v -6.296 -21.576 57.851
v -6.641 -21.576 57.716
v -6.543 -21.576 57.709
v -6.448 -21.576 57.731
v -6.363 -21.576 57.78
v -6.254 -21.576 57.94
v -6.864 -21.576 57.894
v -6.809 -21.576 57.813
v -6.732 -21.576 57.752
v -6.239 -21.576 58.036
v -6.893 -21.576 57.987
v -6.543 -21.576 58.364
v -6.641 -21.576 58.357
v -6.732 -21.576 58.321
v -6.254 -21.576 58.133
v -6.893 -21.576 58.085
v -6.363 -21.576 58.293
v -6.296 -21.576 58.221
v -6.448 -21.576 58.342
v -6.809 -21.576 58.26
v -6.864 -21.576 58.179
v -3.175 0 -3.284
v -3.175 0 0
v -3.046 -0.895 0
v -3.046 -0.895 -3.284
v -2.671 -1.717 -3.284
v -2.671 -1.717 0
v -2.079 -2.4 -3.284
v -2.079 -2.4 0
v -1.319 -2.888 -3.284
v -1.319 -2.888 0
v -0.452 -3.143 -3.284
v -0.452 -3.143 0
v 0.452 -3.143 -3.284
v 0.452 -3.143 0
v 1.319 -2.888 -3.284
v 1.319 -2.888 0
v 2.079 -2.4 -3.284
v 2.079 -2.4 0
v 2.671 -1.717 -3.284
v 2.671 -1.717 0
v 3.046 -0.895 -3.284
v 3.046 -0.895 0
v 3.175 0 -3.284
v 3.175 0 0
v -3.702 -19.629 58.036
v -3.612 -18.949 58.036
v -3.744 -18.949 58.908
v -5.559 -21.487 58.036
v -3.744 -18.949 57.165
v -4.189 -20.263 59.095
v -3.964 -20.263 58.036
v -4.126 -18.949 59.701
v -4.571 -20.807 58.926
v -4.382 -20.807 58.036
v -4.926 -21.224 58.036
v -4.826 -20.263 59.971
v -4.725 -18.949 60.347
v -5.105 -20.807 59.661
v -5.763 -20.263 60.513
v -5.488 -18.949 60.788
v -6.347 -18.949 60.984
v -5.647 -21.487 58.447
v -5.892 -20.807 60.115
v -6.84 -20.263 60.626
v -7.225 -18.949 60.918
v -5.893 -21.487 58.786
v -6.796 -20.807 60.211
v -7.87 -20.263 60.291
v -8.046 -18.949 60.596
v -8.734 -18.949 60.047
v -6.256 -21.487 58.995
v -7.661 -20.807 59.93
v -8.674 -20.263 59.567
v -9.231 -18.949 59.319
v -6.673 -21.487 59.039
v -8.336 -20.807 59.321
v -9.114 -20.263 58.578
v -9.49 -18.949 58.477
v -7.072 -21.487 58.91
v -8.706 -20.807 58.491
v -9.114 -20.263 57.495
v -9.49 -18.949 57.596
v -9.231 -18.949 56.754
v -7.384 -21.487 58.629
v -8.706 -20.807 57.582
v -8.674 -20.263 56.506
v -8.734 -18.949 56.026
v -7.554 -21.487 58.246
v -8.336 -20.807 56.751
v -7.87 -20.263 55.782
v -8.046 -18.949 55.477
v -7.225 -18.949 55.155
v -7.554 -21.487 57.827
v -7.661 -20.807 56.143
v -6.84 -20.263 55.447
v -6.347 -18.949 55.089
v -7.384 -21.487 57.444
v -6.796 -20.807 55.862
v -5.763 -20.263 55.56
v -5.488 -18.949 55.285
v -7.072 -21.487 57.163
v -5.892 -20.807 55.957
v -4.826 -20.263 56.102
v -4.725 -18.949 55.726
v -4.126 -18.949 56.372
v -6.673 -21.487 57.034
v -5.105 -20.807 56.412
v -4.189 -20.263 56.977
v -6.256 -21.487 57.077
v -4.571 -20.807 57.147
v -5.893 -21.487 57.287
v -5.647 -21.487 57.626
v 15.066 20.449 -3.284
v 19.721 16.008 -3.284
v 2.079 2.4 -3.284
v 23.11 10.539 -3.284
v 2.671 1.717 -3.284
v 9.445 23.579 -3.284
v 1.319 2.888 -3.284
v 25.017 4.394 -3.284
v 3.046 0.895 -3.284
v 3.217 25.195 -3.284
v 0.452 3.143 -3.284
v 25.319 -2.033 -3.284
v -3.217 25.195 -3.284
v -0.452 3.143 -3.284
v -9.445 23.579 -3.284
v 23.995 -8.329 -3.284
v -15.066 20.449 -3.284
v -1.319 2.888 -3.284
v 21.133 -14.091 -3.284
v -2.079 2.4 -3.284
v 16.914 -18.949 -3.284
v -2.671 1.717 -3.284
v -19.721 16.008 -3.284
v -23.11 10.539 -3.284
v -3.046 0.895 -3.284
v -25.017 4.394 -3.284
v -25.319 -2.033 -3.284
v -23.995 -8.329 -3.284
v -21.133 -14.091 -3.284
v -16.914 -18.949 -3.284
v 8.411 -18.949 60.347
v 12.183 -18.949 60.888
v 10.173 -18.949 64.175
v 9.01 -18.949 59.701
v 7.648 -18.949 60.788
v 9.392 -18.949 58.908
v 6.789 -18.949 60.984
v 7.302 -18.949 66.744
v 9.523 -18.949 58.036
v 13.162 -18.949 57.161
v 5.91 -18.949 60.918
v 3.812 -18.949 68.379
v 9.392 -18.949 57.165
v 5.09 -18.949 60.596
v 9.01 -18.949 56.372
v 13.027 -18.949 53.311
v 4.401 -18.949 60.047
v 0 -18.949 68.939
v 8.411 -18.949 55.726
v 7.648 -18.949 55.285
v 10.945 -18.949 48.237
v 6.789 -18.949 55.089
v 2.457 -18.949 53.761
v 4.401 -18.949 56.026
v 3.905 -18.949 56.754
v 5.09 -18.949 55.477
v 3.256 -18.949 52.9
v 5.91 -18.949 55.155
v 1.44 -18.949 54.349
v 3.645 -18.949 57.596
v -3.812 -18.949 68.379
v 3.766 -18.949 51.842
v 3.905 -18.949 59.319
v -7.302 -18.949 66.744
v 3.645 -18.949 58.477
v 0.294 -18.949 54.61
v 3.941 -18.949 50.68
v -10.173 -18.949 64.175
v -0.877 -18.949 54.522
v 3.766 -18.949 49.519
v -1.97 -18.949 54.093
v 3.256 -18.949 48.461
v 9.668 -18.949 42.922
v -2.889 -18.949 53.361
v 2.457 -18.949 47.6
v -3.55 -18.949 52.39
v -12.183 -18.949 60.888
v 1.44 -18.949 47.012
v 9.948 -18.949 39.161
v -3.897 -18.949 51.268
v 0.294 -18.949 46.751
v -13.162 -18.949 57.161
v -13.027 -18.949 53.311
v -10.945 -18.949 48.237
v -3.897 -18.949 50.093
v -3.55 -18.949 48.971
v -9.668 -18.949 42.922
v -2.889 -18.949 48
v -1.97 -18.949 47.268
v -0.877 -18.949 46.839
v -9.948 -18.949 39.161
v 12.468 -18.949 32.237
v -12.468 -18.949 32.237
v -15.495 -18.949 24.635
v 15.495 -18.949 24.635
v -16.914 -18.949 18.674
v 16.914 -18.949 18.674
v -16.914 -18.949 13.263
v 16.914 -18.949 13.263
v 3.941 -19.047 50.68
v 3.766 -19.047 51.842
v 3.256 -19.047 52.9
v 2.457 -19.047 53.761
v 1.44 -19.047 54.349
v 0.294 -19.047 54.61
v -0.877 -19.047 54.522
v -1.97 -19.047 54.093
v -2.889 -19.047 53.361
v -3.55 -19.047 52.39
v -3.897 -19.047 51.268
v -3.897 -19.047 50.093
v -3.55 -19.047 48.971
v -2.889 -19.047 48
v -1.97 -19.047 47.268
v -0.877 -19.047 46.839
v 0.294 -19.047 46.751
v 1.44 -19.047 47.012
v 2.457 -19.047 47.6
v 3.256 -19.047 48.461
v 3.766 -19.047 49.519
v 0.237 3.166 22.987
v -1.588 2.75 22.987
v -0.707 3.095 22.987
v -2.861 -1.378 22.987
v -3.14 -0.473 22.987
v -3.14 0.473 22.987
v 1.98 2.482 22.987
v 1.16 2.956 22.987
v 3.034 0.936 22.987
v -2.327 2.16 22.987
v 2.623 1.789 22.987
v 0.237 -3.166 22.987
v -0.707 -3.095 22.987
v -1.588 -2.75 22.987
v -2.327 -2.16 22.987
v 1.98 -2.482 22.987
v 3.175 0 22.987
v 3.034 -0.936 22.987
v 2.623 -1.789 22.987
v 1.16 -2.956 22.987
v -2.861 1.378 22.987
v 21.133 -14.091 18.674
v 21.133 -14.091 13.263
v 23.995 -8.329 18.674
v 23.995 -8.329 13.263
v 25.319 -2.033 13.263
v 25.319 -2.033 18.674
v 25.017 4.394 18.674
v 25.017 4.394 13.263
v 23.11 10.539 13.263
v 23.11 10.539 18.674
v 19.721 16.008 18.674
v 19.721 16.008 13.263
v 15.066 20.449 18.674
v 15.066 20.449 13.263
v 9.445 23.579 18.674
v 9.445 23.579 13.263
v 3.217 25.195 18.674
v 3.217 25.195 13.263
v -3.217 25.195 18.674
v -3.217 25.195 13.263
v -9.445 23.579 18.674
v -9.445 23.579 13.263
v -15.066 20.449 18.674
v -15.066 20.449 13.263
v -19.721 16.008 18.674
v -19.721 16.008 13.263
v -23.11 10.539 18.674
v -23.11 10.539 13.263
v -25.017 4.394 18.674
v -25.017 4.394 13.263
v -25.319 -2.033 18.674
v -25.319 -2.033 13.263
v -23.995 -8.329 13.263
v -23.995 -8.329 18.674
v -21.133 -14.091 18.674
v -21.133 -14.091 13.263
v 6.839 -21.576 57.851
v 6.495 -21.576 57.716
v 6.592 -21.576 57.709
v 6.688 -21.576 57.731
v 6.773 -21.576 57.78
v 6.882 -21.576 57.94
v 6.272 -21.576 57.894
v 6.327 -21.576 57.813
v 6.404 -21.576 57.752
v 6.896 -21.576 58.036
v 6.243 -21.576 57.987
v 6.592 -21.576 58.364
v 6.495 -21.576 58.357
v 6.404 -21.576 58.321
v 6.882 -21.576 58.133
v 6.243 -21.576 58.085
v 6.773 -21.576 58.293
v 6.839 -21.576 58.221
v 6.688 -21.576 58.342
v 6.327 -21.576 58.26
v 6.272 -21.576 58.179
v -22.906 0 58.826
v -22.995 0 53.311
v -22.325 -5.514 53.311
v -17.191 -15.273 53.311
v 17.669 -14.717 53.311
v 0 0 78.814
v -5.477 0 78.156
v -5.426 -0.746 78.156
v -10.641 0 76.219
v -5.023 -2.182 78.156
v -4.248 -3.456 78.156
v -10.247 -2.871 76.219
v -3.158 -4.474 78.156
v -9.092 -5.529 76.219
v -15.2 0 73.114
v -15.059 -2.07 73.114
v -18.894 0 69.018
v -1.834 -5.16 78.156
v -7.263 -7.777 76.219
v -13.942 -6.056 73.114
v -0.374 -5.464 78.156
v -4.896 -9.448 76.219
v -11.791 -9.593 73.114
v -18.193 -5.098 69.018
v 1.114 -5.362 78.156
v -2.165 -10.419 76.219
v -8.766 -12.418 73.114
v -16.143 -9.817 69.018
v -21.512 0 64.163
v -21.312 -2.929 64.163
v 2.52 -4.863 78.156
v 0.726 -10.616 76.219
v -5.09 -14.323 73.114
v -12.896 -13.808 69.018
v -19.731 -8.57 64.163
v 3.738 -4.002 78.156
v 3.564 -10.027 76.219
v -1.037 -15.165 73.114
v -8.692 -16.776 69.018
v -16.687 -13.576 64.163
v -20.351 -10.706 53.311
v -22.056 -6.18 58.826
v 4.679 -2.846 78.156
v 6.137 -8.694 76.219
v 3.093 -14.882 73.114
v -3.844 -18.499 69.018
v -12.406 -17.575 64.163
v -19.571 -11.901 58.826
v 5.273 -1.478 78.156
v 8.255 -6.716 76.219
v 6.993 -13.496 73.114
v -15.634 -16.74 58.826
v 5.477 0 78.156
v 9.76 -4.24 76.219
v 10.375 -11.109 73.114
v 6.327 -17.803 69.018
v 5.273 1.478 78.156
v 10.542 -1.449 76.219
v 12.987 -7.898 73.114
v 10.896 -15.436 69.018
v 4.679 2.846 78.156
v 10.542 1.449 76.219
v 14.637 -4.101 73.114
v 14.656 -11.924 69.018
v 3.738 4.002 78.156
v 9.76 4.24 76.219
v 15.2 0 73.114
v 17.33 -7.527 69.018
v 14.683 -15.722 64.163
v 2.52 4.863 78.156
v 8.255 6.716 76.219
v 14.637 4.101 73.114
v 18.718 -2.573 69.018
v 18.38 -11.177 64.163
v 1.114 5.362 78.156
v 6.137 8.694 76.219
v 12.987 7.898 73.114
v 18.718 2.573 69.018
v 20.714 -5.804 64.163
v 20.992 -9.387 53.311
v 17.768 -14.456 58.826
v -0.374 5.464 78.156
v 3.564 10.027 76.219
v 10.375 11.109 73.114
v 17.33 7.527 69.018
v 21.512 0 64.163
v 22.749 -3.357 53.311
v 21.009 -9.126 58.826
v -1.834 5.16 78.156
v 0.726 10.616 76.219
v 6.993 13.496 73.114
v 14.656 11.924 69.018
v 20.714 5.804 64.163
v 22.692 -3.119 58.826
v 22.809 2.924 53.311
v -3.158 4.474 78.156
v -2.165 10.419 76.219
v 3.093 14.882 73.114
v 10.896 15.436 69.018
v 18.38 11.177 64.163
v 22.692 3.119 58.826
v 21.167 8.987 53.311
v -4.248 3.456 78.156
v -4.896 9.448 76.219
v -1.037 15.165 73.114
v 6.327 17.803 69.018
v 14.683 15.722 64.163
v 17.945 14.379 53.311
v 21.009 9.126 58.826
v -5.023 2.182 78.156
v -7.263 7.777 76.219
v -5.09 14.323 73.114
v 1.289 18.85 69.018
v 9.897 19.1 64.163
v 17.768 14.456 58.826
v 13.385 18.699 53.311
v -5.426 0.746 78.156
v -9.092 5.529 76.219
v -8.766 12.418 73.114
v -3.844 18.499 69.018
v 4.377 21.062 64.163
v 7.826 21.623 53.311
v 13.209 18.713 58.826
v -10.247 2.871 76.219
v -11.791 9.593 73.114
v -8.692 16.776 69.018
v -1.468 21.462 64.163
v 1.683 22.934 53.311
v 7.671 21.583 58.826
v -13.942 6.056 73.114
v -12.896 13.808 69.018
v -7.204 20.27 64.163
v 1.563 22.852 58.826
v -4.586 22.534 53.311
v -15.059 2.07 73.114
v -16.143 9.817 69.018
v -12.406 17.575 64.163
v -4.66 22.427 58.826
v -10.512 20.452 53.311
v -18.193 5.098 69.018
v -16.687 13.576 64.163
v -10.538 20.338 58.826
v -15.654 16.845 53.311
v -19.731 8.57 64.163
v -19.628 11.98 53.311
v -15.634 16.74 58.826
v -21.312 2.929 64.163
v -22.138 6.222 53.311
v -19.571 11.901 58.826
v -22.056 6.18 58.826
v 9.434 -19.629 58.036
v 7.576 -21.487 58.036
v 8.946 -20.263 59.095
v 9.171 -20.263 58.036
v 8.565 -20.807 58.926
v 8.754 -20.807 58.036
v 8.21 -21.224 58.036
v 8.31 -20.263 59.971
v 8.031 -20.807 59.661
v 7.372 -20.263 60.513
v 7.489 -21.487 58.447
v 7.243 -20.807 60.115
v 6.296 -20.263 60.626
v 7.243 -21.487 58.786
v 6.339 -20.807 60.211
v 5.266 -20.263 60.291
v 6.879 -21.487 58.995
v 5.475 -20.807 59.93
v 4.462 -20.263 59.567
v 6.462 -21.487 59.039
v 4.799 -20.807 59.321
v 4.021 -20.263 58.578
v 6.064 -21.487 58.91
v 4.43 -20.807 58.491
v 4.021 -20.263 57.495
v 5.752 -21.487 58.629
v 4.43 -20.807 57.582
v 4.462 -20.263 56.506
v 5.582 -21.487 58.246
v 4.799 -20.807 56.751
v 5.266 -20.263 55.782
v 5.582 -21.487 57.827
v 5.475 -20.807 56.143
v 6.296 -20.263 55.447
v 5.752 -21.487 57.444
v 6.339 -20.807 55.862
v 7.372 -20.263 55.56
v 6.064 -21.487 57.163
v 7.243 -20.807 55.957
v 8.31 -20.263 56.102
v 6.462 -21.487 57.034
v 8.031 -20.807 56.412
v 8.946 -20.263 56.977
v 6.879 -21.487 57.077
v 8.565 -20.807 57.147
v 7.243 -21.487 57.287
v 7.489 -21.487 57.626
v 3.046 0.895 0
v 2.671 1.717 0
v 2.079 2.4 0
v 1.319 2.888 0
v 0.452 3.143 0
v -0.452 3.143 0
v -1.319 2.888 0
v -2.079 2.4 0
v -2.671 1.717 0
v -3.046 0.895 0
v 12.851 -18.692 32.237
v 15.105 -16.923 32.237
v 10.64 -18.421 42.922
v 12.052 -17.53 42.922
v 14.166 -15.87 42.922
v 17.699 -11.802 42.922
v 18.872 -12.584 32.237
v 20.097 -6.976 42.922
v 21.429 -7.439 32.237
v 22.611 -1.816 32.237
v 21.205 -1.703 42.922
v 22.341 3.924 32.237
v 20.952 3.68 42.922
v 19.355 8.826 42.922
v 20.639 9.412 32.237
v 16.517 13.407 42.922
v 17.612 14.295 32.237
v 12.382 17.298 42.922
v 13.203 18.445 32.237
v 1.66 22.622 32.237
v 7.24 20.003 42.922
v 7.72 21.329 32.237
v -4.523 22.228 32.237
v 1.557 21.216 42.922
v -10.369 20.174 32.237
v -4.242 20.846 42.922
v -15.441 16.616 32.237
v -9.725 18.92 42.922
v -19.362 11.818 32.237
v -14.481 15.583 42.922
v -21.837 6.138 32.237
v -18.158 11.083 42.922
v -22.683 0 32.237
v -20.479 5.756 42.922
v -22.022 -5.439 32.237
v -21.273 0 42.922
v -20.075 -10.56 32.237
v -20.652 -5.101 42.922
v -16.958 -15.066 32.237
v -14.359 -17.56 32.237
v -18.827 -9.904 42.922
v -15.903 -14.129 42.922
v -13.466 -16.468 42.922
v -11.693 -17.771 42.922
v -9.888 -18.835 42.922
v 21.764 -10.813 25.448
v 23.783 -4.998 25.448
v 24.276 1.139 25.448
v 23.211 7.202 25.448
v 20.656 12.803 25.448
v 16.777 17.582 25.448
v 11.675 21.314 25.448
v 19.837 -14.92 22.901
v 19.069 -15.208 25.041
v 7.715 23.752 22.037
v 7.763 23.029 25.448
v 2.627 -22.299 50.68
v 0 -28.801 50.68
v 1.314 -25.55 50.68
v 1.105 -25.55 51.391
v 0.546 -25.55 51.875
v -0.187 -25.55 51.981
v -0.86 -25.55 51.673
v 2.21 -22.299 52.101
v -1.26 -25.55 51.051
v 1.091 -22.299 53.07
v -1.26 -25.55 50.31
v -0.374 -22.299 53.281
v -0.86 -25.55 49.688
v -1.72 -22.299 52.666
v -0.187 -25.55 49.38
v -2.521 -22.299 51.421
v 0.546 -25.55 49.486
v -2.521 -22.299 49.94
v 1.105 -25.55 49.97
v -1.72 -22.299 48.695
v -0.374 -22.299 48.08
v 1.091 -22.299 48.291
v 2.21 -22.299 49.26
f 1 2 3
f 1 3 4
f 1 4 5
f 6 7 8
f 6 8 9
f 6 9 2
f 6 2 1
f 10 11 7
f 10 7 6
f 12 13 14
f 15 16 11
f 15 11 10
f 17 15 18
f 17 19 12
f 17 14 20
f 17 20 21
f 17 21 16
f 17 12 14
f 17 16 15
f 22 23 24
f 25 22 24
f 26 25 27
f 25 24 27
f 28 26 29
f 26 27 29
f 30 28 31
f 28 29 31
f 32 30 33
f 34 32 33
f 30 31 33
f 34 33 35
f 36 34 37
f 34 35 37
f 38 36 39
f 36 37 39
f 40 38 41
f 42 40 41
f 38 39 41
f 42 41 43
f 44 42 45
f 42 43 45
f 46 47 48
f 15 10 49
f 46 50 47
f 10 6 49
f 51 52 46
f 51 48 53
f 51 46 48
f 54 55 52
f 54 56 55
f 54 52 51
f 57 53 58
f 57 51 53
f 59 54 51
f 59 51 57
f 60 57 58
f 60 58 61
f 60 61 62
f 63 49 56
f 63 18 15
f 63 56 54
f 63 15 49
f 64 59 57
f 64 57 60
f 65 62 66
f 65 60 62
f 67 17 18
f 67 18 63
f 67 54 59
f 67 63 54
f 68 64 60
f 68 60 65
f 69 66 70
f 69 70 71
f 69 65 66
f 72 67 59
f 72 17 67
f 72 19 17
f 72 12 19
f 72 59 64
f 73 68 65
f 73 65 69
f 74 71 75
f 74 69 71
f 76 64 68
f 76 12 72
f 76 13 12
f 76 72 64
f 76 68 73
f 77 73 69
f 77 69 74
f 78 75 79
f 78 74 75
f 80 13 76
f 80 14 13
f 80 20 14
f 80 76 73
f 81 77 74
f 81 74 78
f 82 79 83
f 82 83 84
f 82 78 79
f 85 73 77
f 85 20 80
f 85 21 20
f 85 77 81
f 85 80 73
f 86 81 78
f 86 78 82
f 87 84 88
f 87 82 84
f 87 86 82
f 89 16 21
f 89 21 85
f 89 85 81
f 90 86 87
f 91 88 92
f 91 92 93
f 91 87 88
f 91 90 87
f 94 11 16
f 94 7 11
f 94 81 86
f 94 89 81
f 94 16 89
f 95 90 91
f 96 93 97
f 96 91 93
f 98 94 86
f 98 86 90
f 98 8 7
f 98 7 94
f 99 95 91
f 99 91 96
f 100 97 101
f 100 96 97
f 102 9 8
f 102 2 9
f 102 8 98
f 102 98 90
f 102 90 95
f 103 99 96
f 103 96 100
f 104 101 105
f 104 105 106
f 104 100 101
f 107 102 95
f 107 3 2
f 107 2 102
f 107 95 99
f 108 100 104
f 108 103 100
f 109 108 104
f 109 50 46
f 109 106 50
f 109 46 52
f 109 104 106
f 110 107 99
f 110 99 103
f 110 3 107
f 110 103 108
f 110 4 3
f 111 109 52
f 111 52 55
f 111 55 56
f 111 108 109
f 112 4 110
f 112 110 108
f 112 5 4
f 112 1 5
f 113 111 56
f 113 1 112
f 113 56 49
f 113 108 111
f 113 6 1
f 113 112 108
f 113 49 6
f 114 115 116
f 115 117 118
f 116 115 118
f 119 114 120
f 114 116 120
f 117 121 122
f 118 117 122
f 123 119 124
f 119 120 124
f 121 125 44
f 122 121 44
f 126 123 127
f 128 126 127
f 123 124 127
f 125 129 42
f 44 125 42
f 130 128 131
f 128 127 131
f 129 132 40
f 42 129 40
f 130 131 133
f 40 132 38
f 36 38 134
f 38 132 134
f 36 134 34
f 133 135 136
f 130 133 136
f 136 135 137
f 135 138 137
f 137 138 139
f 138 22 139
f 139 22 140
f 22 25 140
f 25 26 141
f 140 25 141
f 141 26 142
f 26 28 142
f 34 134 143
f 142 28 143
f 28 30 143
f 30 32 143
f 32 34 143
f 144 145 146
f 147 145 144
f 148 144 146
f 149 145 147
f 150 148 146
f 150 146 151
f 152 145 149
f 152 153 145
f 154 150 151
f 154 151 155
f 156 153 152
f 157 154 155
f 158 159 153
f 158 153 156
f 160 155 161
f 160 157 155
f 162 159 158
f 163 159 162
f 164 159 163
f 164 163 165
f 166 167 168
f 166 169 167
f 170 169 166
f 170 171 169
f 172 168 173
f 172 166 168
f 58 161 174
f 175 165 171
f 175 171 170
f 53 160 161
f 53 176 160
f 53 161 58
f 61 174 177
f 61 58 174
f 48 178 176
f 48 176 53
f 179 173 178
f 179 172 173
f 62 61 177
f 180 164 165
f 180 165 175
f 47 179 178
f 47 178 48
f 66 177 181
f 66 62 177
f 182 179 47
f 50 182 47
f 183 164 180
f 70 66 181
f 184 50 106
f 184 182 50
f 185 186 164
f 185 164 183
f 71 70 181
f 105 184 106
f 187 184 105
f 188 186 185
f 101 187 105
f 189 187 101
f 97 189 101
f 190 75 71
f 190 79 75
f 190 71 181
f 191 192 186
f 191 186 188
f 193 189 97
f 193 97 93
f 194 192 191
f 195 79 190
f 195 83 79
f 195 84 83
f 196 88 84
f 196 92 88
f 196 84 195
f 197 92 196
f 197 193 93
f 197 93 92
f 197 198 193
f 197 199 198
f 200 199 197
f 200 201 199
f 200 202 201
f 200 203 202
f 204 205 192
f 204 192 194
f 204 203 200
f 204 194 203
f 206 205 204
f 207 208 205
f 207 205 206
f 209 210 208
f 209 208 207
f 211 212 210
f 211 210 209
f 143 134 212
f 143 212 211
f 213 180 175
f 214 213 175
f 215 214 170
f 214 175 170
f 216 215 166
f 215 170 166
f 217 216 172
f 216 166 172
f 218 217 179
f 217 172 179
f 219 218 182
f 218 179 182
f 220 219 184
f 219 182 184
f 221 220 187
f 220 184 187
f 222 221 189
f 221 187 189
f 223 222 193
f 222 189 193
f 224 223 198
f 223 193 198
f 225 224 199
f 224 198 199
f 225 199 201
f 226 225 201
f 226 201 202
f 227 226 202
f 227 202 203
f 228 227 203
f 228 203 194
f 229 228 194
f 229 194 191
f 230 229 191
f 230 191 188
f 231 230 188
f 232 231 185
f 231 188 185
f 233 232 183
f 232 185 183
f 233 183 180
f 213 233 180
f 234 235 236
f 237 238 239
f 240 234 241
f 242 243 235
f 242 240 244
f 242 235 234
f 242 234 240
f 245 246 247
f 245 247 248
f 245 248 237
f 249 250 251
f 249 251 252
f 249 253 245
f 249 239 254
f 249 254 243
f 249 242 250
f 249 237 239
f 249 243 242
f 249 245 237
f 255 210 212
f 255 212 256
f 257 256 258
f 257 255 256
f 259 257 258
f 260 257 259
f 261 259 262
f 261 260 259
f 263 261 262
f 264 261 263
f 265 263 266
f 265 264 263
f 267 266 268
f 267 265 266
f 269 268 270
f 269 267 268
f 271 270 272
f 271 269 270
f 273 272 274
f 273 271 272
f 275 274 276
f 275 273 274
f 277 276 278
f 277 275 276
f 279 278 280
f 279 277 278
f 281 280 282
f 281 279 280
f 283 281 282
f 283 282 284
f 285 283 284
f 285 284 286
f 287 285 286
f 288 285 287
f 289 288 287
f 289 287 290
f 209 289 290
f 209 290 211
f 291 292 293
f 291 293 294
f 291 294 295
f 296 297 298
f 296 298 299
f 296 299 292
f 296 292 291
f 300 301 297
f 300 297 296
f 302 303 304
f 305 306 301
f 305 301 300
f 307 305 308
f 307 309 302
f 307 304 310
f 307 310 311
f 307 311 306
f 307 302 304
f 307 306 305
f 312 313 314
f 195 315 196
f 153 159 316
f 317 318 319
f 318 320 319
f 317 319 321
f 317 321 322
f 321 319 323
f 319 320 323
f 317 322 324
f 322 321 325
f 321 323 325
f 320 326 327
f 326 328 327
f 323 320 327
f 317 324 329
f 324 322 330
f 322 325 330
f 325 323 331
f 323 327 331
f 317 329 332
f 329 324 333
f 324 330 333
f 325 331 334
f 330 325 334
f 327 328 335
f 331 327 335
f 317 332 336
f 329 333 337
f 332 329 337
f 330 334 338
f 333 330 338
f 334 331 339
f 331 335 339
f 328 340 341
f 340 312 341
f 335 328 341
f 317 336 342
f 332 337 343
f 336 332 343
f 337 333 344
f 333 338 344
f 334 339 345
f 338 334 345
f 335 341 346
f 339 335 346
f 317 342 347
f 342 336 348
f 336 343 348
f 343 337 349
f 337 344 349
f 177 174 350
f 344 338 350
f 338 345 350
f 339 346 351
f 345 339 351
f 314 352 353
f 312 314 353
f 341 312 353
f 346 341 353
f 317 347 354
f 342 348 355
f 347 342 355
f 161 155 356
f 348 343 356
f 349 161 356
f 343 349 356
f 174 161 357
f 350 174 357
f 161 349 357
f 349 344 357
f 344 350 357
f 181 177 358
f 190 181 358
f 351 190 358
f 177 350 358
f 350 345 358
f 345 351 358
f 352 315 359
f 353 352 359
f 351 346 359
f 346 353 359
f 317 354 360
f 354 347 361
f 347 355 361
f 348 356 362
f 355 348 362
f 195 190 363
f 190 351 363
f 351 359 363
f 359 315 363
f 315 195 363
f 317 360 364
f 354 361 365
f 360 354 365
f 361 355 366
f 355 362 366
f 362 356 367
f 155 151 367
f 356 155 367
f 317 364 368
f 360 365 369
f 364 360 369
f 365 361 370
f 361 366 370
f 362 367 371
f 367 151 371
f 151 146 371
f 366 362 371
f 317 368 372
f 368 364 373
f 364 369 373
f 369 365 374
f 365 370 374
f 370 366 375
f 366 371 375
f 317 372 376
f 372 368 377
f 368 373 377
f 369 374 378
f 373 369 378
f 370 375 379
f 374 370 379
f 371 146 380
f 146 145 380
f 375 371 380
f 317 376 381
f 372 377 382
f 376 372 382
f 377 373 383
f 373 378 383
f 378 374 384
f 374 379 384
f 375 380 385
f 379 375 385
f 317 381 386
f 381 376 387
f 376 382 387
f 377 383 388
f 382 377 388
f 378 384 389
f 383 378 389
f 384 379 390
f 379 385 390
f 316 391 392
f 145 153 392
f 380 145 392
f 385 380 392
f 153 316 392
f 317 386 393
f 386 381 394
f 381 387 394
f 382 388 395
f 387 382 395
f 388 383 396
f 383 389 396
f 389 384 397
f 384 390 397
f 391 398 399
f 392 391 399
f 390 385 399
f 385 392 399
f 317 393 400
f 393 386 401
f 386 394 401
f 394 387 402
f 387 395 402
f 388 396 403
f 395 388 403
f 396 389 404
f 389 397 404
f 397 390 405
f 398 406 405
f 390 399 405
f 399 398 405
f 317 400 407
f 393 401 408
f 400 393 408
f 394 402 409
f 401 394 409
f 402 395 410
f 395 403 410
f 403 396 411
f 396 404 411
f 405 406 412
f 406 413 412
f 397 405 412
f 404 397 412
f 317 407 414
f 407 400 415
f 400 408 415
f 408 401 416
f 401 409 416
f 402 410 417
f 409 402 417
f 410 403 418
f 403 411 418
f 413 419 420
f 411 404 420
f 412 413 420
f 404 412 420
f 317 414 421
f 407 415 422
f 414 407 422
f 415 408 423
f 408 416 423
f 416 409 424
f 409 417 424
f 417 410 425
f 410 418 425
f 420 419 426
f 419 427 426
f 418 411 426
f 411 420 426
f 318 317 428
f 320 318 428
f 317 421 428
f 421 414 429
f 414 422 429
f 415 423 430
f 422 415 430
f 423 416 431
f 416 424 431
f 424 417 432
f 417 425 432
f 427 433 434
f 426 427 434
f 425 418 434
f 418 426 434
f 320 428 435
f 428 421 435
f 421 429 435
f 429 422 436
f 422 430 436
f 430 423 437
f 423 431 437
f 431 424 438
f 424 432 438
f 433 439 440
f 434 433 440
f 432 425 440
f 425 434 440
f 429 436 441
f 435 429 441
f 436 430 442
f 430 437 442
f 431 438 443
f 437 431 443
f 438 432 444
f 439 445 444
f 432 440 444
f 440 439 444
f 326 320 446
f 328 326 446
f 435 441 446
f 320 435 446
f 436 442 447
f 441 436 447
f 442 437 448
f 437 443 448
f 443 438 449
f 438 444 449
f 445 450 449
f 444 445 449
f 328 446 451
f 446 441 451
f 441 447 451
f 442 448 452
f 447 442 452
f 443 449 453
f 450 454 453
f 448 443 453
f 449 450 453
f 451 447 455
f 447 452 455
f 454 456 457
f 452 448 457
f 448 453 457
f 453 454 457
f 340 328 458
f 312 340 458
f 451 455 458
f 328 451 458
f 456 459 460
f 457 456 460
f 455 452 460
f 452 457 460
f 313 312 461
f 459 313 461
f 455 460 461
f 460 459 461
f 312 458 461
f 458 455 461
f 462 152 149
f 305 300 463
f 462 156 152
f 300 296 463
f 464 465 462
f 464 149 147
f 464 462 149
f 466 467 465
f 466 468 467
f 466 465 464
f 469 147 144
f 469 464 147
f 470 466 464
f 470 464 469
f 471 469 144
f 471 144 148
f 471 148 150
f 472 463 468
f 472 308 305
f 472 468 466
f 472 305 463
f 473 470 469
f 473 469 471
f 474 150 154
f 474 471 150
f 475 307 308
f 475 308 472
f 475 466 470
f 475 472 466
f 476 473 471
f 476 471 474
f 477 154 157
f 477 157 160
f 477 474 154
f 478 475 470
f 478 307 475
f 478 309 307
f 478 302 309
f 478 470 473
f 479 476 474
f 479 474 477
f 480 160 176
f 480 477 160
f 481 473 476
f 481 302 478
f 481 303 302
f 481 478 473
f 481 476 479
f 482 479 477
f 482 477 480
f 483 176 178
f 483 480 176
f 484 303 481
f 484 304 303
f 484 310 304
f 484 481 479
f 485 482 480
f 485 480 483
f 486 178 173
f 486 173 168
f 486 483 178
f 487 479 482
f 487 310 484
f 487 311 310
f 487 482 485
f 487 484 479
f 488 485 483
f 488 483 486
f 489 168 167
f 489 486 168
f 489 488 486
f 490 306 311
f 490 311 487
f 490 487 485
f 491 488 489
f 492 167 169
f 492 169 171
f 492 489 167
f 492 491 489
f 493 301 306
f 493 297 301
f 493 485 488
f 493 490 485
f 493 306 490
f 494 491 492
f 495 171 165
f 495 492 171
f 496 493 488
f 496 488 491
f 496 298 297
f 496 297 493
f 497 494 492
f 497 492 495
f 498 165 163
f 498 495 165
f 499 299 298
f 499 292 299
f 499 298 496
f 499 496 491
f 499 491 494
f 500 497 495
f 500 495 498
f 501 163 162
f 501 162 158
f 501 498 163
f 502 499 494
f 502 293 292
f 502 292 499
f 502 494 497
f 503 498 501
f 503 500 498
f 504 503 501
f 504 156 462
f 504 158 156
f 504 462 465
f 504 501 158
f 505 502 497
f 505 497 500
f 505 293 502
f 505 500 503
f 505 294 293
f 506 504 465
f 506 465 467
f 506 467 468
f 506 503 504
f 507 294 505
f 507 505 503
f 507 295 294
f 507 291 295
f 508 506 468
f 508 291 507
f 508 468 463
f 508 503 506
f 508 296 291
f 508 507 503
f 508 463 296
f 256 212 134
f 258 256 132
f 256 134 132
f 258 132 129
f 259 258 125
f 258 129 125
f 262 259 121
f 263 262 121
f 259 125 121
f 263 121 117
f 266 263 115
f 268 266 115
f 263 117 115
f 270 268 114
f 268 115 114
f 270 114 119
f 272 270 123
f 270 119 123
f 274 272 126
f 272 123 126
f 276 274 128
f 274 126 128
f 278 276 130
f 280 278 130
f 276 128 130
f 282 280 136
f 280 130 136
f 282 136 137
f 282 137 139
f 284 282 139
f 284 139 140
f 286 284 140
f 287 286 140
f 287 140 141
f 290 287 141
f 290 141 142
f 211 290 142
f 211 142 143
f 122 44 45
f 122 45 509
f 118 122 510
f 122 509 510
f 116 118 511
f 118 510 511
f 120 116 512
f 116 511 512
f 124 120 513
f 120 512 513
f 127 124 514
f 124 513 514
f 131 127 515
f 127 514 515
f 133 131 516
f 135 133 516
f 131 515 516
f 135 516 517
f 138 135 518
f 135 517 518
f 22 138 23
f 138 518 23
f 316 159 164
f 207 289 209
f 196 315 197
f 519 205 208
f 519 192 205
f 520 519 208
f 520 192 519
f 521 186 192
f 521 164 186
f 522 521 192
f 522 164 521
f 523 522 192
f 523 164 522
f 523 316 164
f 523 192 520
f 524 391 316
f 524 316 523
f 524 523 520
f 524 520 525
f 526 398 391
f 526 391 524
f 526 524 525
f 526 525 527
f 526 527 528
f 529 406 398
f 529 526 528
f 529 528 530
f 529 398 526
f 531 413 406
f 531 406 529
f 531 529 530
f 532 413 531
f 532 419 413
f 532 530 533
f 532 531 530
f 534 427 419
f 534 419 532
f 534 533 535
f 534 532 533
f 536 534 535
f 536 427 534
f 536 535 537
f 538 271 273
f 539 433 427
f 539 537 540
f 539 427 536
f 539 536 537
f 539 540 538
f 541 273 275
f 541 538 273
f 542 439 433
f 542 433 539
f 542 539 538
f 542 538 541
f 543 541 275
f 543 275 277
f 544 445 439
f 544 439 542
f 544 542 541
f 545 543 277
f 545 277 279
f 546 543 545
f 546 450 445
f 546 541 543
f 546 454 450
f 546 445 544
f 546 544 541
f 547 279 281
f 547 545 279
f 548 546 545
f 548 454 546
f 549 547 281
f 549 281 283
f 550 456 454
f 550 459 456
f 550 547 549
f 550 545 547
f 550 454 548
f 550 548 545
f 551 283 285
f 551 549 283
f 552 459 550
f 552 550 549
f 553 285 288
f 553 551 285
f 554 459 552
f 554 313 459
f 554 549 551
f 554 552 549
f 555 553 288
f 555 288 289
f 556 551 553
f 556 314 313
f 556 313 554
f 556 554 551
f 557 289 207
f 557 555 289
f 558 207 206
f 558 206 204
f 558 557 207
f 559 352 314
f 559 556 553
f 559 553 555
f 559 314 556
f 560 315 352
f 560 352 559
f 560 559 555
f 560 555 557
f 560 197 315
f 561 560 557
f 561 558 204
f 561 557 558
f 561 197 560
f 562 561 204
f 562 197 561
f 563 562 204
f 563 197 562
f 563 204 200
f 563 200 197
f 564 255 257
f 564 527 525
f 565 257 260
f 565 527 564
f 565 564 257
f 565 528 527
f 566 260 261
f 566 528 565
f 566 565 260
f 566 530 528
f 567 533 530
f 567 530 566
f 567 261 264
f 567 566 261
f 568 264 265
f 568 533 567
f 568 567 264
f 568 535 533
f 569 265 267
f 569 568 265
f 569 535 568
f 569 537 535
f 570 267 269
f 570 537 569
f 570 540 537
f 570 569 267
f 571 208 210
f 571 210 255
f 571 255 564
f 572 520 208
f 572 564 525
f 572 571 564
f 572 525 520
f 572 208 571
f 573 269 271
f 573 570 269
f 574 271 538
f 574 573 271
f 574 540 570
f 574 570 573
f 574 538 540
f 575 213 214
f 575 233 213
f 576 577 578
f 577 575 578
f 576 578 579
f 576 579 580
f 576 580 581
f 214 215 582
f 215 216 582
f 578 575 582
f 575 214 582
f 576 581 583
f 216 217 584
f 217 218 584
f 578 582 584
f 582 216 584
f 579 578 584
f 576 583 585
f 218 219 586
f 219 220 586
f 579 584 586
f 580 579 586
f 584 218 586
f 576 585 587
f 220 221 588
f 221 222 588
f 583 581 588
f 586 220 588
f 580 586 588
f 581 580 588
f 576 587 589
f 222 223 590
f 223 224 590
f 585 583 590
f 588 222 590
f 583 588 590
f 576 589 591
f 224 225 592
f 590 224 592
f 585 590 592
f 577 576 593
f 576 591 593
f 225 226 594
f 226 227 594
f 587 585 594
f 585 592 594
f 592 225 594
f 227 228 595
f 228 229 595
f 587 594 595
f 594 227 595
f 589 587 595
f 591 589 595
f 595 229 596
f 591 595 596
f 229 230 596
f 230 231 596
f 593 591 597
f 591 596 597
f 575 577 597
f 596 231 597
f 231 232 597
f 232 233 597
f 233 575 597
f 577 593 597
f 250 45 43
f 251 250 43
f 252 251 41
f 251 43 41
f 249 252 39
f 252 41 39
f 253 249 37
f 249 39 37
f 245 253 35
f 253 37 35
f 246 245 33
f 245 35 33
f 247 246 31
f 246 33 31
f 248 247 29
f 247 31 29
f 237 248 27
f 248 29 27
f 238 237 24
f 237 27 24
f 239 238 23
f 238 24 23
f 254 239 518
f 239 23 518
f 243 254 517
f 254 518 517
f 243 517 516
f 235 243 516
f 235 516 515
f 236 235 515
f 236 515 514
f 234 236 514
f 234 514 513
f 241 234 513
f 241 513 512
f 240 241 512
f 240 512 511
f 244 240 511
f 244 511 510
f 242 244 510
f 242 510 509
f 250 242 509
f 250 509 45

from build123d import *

# Parameters (mm, degrees)
F3_DEPTH      = 177.8
F3_DEPTH_BACK = 12.7
F4_R          = 7.62
F5_DEPTH      = 19.05
F6_SIZE2      = 18.860161823
F6_SIZE       = 7.62
F4_R_2        = 5.715
F7_DEPTH      = 5.08
F8_R          = 5.07999
F9_R          = 6.139399456
F10_DEPTH     = 50.8
F11_SCALE     = 0.51715159


# Not quite as in the source:
# - a fillet or chamfer is up to 0.001 mm smaller than in the source, because OpenCascade refuses the exact size


with BuildPart() as f1:
    # F0 (on Front) → F1 (revolve)
    with BuildSketch(Plane.XZ):
        with BuildLine():
            Line((-6.139399456, 0), (0, 0))
            Line((0, 0), (0, 146.0500033258))
            Line((0, 146.0500033258), (0, 152.4))
            ThreePointArc((0, 152.4), (-33.2006597867, 137.6319951518), (-44.4655865431, 103.0852268133))
            add(Edge.make_bspline(
                [(-49.1152013464, 36.1084283333), (-48.0326439436, 49.6014705241), (-37.8272166921, 76.0482431769), (-42.543614325, 94.8604386904), (-44.4655865431, 103.0852268133)],
                knots=[0.3424224234, 0.3424224234, 0.3424224234, 0.3424224234, 0.7066775859, 1, 1, 1, 1], degree=3))
            Line((-49.1152013464, 36.1084283333), (-49.1152013464, 25.6455829718))
            add(Edge.make_bspline(
                [(-44.4655865431, 0), (-46.3688797408, 8.4610342592), (-48.4665187415, 16.8703142107), (-49.1152013464, 25.6455829718)],
                knots=[0, 0, 0, 0, 0.246321171, 0.246321171, 0.246321171, 0.246321171], degree=3))
            Line((-44.4655865431, 0), (-38.2711647941, 0))
            Line((-38.2711647941, 0), (-6.139399456, 0))
        make_face()
        Polygon((-6.139399456, -6.35), (-6.139399456, 0), (-38.2711647941, 0), (-44.4655865431, 0), (-44.4655865431, -6.35), align=None)
        with BuildLine():
            Line((-44.4655865431, -6.35), (-44.4655865431, 0))
            add(Edge.make_bspline(
                [(-44.4655865431, 0), (-46.3688797408, 8.4610342592), (-48.4665187415, 16.8703142107), (-49.1152013464, 25.6455829718)],
                knots=[0, 0, 0, 0, 0.246321171, 0.246321171, 0.246321171, 0.246321171], degree=3))
            Line((-49.1152013464, 25.6455829718), (-49.1152013464, 0))
            Line((-49.1152013464, 0), (-49.1152013464, -6.35))
            Line((-49.1152013464, -6.35), (-44.4655865431, -6.35))
        make_face()
        with BuildLine():
            add(Edge.make_bspline(
                [(-49.1152013464, 25.6455829718), (-49.3682823563, 29.0692201465), (-49.4008119098, 32.5485659437), (-49.1152013464, 36.1084283333)],
                knots=[0.246321171, 0.246321171, 0.246321171, 0.246321171, 0.3424224234, 0.3424224234, 0.3424224234, 0.3424224234], degree=3))
            Line((-49.1152013464, 25.6455829718), (-49.1152013464, 36.1084283333))
        make_face()
    revolve(axis=Axis((0, 0, 76.2), (0, 0, 1)))

    # F2 (on Top) → F3 (cut, two sides)
    with BuildSketch(Plane.XY) as f3_sk:
        Polygon((25.6092443837, -36.641700535), (-25.1907556163, -36.641700535), (-46.7807556163, -36.641700535), (-46.7807556163, -67.121700535), (42.1192443837, -67.121700535), (42.1192443837, -36.641700535), align=None)
    extrude(amount=F3_DEPTH, mode=Mode.SUBTRACT)
    extrude(f3_sk.sketch, amount=-F3_DEPTH_BACK, mode=Mode.SUBTRACT)

    # F4 (on face) → F5 (join)
    with BuildSketch(Plane.XZ.offset(36.641700535)):
        with Locations((0, 97.9992443837)):
            Circle(F4_R)
    extrude(amount=F5_DEPTH)

    # F6
    f6_edges = [f1.edges().sort_by_distance(p)[0] for p in [
        (-7.62, -55.691701, 97.999244),
    ]]
    f6_side = f1.faces().sort_by_distance((0, -55.691701, 97.999244))[0]
    chamfer(f6_edges, length=F6_SIZE, length2=F6_SIZE2, reference=f6_side)

    # F4 (on face) → F7 (join)
    with BuildSketch(Plane.XZ.offset(36.641700535)):
        with Locations((-12.7, 112.2232443837)):
            Circle(F4_R_2)
        with Locations((12.7, 112.2232443837)):
            Circle(F4_R_2)
    extrude(amount=F7_DEPTH)

    # F8 (radius 5.08 in the source; OpenCascade refuses exactly that, so slightly less here)
    f8_edges = [f1.edges().sort_by_distance(p)[0] for p in [
        (-18.415, -41.721701, 112.223244),
        (6.985, -41.721701, 112.223244),
    ]]
    fillet(f8_edges, radius=F8_R)

    # F9 (on face) → F10 (cut)
    with BuildSketch(Plane(origin=(0, 0, -6.35), x_dir=(1, 0, 0), z_dir=(0, 0, -1))):
        Circle(F9_R)
    extrude(amount=-F10_DEPTH, mode=Mode.SUBTRACT)


with BuildPart() as f1_1:
    # F11: moved
    add(f1.part.scale(F11_SCALE))


solid = f1_1.part
